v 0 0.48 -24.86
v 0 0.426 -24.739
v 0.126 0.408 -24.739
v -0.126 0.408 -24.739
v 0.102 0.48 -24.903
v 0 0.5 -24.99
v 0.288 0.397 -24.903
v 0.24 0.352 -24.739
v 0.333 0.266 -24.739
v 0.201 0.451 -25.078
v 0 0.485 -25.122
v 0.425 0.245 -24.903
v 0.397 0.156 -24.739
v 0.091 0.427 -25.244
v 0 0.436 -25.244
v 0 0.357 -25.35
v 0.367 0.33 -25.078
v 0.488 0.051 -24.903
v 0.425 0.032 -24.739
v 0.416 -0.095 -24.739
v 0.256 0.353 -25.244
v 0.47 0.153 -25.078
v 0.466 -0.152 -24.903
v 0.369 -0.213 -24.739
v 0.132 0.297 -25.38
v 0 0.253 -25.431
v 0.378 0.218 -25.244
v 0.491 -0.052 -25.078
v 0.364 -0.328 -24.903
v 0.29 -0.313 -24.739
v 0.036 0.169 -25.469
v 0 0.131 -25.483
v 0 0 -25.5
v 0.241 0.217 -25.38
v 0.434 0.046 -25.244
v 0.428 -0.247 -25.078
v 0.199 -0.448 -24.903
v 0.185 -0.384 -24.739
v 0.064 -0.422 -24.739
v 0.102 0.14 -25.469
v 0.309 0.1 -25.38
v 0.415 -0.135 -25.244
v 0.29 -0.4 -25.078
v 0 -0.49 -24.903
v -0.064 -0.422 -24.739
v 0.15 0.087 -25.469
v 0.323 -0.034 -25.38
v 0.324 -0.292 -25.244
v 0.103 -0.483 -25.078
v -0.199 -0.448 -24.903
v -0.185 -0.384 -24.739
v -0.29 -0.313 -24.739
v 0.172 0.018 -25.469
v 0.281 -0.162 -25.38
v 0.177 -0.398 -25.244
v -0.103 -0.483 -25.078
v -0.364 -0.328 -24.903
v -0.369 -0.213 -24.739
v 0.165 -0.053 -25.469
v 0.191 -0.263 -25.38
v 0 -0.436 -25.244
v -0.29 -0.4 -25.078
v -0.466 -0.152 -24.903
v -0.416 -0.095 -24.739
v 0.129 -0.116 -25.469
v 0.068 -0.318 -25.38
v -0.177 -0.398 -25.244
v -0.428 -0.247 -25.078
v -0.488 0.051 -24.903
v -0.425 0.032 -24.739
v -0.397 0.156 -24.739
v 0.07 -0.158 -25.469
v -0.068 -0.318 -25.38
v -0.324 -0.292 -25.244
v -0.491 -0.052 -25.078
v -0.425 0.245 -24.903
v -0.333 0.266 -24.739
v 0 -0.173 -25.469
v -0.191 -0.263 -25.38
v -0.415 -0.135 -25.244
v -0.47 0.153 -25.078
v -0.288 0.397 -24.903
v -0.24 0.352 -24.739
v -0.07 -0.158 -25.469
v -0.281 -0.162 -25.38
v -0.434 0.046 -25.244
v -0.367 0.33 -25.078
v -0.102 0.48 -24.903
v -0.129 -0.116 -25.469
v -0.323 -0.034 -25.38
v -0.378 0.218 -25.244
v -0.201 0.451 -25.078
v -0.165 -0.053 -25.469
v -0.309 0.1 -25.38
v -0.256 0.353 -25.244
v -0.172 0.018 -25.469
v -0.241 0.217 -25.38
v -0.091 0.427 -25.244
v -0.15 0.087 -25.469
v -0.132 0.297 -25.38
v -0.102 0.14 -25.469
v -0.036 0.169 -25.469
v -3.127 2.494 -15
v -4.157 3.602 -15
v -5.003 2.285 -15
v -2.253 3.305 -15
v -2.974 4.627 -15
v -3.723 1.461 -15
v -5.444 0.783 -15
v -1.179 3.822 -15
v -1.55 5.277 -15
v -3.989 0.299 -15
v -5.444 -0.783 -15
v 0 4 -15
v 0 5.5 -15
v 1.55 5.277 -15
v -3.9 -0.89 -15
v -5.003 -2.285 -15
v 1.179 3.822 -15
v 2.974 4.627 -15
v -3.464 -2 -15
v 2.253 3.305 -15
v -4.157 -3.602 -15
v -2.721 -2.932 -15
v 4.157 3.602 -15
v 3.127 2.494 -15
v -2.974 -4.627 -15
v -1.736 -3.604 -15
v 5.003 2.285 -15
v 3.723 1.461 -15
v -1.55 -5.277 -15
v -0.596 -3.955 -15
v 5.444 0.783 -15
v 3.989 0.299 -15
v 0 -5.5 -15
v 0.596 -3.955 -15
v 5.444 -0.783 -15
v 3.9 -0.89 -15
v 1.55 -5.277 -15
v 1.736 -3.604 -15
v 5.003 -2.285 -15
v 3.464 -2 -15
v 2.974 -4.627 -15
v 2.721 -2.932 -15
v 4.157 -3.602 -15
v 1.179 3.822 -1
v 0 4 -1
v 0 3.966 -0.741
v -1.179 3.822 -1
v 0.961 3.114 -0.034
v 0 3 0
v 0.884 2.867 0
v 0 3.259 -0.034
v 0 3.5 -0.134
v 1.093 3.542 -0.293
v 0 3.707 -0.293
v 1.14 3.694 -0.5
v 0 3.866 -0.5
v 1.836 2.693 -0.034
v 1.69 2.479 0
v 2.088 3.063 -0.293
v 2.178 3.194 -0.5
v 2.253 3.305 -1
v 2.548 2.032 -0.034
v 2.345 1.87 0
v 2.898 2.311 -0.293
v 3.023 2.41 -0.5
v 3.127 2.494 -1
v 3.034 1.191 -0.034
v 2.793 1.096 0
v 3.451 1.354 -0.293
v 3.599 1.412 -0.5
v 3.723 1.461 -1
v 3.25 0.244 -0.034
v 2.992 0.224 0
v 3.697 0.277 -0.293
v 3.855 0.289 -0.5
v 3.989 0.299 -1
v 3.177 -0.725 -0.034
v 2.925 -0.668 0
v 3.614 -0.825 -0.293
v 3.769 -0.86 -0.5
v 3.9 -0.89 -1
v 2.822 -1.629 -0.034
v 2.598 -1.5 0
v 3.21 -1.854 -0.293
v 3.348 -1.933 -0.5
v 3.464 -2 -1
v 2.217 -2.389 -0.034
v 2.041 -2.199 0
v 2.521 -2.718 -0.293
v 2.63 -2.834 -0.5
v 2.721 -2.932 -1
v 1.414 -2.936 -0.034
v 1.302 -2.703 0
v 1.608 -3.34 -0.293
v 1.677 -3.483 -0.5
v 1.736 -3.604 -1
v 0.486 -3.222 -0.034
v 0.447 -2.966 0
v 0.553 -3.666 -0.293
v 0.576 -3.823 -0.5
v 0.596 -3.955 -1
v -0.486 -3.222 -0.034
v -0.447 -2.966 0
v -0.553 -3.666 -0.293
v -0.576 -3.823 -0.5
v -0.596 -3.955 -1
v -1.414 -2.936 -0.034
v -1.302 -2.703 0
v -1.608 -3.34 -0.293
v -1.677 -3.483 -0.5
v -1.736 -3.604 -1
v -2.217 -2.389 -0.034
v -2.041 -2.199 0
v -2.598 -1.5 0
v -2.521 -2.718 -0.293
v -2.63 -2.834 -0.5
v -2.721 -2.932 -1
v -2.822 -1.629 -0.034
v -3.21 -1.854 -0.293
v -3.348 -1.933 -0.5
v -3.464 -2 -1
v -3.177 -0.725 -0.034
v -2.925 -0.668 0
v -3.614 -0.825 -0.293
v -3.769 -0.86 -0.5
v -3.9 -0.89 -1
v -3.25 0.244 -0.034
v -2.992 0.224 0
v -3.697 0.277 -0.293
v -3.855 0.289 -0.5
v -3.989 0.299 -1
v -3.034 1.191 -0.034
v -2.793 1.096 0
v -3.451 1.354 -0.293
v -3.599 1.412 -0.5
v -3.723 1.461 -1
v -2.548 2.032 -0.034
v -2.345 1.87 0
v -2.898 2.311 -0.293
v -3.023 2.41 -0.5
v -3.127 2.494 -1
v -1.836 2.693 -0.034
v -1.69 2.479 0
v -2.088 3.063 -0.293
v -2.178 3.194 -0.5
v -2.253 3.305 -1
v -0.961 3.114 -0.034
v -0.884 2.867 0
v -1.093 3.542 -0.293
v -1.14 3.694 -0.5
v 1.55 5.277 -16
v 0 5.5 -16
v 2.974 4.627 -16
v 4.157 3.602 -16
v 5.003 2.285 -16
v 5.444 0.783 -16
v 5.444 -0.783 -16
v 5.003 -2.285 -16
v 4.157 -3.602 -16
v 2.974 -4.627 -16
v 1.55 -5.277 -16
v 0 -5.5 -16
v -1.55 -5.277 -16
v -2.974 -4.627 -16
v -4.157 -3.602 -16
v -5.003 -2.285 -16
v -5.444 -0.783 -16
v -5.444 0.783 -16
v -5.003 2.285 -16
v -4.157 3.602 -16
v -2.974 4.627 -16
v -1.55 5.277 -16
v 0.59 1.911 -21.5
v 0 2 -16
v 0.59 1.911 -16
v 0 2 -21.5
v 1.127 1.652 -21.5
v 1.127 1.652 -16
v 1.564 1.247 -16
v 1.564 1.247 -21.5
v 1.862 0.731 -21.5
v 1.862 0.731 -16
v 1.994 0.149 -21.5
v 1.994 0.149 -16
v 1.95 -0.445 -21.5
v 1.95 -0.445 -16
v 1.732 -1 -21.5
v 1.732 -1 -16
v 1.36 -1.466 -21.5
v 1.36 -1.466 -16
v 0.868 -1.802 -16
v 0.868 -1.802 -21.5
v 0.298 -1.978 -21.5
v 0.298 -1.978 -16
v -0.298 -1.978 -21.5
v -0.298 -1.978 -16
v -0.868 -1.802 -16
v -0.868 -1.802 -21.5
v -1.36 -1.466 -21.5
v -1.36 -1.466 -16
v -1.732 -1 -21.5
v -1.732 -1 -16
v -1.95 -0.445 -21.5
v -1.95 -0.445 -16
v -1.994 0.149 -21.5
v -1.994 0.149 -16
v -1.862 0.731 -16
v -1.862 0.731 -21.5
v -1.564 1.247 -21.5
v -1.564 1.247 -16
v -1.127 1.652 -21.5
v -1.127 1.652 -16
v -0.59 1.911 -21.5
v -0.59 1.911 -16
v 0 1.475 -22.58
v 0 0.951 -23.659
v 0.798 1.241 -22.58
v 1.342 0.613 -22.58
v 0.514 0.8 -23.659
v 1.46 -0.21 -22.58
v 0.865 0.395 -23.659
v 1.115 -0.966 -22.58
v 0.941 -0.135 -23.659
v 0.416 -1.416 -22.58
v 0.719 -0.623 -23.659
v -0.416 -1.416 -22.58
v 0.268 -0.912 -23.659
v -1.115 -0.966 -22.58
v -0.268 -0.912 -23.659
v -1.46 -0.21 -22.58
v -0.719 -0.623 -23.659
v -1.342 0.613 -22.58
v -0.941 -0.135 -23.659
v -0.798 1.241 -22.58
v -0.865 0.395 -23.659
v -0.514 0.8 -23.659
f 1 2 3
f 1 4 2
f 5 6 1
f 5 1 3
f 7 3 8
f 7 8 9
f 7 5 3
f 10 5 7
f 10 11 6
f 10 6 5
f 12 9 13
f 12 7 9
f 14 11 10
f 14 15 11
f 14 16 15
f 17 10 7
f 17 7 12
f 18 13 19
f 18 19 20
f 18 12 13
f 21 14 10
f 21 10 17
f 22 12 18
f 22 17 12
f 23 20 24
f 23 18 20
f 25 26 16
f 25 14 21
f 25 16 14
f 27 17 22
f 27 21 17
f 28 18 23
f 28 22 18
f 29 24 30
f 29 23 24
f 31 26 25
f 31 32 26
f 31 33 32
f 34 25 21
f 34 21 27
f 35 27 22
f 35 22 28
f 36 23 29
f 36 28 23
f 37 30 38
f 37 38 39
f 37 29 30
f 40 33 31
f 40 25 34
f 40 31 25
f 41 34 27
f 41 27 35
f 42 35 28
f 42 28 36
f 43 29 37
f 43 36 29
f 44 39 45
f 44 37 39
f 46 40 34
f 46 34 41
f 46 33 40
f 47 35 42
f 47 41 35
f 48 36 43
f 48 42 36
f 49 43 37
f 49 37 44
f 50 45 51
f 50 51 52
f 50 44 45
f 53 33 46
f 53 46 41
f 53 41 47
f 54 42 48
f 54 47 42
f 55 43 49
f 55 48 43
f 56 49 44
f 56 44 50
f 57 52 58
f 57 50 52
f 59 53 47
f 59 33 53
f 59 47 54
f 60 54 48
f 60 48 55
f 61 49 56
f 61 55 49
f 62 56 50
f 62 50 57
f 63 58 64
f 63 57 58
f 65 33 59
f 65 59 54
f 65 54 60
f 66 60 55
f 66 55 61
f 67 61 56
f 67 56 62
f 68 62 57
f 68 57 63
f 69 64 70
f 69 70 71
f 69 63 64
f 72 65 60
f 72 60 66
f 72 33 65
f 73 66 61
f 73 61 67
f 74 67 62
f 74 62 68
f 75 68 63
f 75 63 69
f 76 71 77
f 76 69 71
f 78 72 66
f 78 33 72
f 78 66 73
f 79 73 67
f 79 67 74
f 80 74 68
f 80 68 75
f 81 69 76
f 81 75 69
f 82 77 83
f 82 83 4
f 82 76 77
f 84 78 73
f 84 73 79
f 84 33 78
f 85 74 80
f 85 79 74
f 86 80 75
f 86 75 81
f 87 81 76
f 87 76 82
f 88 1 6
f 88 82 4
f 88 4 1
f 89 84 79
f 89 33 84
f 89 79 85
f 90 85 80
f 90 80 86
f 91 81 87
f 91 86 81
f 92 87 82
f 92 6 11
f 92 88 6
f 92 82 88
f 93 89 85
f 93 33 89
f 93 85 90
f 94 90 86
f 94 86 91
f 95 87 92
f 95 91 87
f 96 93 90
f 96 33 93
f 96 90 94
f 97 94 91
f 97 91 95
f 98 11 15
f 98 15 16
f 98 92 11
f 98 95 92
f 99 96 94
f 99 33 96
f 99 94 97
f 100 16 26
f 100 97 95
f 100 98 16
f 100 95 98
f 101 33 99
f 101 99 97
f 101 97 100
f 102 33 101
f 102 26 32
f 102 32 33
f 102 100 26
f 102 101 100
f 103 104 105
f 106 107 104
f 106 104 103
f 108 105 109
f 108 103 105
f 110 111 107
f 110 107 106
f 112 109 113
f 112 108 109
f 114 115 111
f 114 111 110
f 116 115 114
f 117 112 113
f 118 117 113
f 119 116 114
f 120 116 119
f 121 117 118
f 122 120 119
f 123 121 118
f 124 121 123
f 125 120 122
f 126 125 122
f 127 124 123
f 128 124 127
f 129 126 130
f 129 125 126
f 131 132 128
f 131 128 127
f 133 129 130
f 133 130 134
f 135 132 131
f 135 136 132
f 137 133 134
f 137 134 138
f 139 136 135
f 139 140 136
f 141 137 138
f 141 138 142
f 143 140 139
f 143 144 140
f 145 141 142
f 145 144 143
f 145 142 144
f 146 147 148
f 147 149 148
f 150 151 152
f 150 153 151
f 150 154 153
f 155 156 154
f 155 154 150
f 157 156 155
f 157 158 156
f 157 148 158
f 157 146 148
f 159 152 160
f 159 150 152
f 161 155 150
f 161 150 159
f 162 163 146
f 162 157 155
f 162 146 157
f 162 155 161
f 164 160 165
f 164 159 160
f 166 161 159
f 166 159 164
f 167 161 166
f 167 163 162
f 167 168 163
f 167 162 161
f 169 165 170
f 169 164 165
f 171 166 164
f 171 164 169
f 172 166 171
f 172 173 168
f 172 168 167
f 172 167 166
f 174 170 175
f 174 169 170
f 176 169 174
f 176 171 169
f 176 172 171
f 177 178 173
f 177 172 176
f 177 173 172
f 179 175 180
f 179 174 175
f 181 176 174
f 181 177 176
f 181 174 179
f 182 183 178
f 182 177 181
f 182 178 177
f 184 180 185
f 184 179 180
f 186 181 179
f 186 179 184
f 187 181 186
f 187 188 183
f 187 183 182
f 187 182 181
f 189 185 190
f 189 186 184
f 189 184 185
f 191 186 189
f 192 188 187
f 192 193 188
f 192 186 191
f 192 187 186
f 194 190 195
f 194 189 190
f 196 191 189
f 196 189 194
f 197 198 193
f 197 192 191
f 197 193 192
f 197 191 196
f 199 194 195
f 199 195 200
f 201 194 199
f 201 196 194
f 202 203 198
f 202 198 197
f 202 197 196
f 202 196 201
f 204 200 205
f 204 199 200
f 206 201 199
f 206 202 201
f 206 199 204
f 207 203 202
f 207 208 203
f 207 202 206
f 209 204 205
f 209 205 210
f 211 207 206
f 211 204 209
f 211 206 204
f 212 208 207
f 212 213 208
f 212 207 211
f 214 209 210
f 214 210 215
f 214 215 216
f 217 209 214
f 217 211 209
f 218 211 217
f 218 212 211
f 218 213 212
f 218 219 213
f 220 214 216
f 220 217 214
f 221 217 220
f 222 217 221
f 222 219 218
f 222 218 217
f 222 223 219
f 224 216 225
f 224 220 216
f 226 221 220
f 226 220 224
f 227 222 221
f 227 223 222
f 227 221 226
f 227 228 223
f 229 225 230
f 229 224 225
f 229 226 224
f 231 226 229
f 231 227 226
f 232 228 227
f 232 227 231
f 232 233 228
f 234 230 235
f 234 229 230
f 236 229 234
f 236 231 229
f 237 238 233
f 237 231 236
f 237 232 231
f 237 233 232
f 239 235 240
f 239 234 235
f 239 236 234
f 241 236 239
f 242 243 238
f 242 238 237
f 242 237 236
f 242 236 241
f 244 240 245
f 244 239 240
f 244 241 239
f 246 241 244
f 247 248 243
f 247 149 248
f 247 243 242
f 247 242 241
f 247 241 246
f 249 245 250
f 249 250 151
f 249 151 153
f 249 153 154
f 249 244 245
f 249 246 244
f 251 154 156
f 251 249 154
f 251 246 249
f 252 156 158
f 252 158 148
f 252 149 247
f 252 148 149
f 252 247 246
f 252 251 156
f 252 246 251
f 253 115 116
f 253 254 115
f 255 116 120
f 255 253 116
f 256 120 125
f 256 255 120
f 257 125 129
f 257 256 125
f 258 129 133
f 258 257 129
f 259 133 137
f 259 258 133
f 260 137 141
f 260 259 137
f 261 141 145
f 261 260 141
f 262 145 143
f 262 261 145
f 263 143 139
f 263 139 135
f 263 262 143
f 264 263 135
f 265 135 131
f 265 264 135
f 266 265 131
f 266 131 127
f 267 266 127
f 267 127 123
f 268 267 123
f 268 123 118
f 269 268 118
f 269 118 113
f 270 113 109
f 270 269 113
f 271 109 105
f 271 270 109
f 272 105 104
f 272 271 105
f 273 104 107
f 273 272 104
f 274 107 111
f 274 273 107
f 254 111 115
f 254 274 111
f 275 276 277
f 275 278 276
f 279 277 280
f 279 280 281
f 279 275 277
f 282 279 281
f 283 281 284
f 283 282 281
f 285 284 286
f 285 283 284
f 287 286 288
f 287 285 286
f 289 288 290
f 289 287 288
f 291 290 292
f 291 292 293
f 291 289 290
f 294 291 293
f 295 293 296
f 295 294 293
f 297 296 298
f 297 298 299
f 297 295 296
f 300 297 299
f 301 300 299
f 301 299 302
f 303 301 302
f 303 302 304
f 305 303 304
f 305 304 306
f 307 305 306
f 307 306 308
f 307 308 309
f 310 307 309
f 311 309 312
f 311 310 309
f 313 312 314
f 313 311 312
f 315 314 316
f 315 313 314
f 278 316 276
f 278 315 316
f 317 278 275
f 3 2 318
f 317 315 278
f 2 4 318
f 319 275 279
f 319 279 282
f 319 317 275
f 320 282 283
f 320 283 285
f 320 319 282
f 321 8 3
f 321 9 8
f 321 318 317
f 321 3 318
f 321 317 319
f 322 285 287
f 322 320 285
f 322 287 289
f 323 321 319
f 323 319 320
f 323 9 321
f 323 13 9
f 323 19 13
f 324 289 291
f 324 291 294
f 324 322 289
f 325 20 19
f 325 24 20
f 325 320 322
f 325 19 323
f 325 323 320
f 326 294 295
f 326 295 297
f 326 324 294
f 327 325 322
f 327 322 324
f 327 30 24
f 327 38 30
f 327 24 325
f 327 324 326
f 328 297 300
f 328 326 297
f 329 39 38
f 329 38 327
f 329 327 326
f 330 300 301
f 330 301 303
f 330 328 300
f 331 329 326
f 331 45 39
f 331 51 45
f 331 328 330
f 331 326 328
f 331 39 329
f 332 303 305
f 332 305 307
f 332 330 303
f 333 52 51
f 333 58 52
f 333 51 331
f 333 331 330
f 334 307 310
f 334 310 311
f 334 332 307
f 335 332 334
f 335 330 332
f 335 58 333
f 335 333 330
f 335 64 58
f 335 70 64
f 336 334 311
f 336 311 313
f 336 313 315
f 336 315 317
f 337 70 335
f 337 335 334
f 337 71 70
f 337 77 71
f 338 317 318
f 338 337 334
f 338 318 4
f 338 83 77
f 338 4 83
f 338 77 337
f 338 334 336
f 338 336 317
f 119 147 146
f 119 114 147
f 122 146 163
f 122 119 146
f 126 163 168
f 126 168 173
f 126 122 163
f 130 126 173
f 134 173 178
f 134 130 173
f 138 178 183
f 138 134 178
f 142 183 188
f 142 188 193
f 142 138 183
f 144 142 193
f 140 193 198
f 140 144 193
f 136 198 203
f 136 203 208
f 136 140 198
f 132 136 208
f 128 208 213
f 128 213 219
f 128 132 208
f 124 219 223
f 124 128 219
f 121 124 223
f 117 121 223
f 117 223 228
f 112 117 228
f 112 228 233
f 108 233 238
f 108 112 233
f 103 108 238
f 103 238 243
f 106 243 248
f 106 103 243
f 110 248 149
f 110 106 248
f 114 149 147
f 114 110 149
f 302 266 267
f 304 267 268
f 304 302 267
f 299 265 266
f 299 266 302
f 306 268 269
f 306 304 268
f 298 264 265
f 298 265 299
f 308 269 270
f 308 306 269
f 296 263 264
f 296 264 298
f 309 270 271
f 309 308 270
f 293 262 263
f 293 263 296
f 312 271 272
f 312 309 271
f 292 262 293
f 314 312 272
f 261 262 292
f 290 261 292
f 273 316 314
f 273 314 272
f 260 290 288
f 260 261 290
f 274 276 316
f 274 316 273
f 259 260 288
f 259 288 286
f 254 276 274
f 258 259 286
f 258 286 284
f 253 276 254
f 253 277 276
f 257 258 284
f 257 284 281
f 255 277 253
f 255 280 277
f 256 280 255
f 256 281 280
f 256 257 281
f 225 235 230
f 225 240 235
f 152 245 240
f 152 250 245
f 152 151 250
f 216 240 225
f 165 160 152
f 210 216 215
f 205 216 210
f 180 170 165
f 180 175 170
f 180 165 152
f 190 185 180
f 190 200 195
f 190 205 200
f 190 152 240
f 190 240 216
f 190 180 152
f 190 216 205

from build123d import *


with BuildPart() as part:
    # Sketch5 → Revolve1 (revolve)
    with BuildSketch(Plane(origin=(0, 0, 0), x_dir=(0, 0, -1), z_dir=(1, 0, 0))):
        with BuildLine():
            Line((0, 0), (0, 3))
            ThreePointArc((0, 3), (0.292893219, 3.707106781), (1, 4))
            Line((1, 4), (15, 4))
            Line((15, 4), (15, 5.5))
            Line((15, 5.5), (16, 5.5))
            Line((16, 5.5), (16, 2))
            Line((16, 2), (21.5, 2))
            Line((21.5, 2), (24.738971507, 0.426455304))
            ThreePointArc((24.738971507, 0.426455304), (25.24442356, 0.436184735), (25.5, 0))
            Line((25.5, 0), (0, 0))
        make_face()
    revolve(axis=Axis((0, 0, 0), (0, 0, -1)))


solid = part.part
